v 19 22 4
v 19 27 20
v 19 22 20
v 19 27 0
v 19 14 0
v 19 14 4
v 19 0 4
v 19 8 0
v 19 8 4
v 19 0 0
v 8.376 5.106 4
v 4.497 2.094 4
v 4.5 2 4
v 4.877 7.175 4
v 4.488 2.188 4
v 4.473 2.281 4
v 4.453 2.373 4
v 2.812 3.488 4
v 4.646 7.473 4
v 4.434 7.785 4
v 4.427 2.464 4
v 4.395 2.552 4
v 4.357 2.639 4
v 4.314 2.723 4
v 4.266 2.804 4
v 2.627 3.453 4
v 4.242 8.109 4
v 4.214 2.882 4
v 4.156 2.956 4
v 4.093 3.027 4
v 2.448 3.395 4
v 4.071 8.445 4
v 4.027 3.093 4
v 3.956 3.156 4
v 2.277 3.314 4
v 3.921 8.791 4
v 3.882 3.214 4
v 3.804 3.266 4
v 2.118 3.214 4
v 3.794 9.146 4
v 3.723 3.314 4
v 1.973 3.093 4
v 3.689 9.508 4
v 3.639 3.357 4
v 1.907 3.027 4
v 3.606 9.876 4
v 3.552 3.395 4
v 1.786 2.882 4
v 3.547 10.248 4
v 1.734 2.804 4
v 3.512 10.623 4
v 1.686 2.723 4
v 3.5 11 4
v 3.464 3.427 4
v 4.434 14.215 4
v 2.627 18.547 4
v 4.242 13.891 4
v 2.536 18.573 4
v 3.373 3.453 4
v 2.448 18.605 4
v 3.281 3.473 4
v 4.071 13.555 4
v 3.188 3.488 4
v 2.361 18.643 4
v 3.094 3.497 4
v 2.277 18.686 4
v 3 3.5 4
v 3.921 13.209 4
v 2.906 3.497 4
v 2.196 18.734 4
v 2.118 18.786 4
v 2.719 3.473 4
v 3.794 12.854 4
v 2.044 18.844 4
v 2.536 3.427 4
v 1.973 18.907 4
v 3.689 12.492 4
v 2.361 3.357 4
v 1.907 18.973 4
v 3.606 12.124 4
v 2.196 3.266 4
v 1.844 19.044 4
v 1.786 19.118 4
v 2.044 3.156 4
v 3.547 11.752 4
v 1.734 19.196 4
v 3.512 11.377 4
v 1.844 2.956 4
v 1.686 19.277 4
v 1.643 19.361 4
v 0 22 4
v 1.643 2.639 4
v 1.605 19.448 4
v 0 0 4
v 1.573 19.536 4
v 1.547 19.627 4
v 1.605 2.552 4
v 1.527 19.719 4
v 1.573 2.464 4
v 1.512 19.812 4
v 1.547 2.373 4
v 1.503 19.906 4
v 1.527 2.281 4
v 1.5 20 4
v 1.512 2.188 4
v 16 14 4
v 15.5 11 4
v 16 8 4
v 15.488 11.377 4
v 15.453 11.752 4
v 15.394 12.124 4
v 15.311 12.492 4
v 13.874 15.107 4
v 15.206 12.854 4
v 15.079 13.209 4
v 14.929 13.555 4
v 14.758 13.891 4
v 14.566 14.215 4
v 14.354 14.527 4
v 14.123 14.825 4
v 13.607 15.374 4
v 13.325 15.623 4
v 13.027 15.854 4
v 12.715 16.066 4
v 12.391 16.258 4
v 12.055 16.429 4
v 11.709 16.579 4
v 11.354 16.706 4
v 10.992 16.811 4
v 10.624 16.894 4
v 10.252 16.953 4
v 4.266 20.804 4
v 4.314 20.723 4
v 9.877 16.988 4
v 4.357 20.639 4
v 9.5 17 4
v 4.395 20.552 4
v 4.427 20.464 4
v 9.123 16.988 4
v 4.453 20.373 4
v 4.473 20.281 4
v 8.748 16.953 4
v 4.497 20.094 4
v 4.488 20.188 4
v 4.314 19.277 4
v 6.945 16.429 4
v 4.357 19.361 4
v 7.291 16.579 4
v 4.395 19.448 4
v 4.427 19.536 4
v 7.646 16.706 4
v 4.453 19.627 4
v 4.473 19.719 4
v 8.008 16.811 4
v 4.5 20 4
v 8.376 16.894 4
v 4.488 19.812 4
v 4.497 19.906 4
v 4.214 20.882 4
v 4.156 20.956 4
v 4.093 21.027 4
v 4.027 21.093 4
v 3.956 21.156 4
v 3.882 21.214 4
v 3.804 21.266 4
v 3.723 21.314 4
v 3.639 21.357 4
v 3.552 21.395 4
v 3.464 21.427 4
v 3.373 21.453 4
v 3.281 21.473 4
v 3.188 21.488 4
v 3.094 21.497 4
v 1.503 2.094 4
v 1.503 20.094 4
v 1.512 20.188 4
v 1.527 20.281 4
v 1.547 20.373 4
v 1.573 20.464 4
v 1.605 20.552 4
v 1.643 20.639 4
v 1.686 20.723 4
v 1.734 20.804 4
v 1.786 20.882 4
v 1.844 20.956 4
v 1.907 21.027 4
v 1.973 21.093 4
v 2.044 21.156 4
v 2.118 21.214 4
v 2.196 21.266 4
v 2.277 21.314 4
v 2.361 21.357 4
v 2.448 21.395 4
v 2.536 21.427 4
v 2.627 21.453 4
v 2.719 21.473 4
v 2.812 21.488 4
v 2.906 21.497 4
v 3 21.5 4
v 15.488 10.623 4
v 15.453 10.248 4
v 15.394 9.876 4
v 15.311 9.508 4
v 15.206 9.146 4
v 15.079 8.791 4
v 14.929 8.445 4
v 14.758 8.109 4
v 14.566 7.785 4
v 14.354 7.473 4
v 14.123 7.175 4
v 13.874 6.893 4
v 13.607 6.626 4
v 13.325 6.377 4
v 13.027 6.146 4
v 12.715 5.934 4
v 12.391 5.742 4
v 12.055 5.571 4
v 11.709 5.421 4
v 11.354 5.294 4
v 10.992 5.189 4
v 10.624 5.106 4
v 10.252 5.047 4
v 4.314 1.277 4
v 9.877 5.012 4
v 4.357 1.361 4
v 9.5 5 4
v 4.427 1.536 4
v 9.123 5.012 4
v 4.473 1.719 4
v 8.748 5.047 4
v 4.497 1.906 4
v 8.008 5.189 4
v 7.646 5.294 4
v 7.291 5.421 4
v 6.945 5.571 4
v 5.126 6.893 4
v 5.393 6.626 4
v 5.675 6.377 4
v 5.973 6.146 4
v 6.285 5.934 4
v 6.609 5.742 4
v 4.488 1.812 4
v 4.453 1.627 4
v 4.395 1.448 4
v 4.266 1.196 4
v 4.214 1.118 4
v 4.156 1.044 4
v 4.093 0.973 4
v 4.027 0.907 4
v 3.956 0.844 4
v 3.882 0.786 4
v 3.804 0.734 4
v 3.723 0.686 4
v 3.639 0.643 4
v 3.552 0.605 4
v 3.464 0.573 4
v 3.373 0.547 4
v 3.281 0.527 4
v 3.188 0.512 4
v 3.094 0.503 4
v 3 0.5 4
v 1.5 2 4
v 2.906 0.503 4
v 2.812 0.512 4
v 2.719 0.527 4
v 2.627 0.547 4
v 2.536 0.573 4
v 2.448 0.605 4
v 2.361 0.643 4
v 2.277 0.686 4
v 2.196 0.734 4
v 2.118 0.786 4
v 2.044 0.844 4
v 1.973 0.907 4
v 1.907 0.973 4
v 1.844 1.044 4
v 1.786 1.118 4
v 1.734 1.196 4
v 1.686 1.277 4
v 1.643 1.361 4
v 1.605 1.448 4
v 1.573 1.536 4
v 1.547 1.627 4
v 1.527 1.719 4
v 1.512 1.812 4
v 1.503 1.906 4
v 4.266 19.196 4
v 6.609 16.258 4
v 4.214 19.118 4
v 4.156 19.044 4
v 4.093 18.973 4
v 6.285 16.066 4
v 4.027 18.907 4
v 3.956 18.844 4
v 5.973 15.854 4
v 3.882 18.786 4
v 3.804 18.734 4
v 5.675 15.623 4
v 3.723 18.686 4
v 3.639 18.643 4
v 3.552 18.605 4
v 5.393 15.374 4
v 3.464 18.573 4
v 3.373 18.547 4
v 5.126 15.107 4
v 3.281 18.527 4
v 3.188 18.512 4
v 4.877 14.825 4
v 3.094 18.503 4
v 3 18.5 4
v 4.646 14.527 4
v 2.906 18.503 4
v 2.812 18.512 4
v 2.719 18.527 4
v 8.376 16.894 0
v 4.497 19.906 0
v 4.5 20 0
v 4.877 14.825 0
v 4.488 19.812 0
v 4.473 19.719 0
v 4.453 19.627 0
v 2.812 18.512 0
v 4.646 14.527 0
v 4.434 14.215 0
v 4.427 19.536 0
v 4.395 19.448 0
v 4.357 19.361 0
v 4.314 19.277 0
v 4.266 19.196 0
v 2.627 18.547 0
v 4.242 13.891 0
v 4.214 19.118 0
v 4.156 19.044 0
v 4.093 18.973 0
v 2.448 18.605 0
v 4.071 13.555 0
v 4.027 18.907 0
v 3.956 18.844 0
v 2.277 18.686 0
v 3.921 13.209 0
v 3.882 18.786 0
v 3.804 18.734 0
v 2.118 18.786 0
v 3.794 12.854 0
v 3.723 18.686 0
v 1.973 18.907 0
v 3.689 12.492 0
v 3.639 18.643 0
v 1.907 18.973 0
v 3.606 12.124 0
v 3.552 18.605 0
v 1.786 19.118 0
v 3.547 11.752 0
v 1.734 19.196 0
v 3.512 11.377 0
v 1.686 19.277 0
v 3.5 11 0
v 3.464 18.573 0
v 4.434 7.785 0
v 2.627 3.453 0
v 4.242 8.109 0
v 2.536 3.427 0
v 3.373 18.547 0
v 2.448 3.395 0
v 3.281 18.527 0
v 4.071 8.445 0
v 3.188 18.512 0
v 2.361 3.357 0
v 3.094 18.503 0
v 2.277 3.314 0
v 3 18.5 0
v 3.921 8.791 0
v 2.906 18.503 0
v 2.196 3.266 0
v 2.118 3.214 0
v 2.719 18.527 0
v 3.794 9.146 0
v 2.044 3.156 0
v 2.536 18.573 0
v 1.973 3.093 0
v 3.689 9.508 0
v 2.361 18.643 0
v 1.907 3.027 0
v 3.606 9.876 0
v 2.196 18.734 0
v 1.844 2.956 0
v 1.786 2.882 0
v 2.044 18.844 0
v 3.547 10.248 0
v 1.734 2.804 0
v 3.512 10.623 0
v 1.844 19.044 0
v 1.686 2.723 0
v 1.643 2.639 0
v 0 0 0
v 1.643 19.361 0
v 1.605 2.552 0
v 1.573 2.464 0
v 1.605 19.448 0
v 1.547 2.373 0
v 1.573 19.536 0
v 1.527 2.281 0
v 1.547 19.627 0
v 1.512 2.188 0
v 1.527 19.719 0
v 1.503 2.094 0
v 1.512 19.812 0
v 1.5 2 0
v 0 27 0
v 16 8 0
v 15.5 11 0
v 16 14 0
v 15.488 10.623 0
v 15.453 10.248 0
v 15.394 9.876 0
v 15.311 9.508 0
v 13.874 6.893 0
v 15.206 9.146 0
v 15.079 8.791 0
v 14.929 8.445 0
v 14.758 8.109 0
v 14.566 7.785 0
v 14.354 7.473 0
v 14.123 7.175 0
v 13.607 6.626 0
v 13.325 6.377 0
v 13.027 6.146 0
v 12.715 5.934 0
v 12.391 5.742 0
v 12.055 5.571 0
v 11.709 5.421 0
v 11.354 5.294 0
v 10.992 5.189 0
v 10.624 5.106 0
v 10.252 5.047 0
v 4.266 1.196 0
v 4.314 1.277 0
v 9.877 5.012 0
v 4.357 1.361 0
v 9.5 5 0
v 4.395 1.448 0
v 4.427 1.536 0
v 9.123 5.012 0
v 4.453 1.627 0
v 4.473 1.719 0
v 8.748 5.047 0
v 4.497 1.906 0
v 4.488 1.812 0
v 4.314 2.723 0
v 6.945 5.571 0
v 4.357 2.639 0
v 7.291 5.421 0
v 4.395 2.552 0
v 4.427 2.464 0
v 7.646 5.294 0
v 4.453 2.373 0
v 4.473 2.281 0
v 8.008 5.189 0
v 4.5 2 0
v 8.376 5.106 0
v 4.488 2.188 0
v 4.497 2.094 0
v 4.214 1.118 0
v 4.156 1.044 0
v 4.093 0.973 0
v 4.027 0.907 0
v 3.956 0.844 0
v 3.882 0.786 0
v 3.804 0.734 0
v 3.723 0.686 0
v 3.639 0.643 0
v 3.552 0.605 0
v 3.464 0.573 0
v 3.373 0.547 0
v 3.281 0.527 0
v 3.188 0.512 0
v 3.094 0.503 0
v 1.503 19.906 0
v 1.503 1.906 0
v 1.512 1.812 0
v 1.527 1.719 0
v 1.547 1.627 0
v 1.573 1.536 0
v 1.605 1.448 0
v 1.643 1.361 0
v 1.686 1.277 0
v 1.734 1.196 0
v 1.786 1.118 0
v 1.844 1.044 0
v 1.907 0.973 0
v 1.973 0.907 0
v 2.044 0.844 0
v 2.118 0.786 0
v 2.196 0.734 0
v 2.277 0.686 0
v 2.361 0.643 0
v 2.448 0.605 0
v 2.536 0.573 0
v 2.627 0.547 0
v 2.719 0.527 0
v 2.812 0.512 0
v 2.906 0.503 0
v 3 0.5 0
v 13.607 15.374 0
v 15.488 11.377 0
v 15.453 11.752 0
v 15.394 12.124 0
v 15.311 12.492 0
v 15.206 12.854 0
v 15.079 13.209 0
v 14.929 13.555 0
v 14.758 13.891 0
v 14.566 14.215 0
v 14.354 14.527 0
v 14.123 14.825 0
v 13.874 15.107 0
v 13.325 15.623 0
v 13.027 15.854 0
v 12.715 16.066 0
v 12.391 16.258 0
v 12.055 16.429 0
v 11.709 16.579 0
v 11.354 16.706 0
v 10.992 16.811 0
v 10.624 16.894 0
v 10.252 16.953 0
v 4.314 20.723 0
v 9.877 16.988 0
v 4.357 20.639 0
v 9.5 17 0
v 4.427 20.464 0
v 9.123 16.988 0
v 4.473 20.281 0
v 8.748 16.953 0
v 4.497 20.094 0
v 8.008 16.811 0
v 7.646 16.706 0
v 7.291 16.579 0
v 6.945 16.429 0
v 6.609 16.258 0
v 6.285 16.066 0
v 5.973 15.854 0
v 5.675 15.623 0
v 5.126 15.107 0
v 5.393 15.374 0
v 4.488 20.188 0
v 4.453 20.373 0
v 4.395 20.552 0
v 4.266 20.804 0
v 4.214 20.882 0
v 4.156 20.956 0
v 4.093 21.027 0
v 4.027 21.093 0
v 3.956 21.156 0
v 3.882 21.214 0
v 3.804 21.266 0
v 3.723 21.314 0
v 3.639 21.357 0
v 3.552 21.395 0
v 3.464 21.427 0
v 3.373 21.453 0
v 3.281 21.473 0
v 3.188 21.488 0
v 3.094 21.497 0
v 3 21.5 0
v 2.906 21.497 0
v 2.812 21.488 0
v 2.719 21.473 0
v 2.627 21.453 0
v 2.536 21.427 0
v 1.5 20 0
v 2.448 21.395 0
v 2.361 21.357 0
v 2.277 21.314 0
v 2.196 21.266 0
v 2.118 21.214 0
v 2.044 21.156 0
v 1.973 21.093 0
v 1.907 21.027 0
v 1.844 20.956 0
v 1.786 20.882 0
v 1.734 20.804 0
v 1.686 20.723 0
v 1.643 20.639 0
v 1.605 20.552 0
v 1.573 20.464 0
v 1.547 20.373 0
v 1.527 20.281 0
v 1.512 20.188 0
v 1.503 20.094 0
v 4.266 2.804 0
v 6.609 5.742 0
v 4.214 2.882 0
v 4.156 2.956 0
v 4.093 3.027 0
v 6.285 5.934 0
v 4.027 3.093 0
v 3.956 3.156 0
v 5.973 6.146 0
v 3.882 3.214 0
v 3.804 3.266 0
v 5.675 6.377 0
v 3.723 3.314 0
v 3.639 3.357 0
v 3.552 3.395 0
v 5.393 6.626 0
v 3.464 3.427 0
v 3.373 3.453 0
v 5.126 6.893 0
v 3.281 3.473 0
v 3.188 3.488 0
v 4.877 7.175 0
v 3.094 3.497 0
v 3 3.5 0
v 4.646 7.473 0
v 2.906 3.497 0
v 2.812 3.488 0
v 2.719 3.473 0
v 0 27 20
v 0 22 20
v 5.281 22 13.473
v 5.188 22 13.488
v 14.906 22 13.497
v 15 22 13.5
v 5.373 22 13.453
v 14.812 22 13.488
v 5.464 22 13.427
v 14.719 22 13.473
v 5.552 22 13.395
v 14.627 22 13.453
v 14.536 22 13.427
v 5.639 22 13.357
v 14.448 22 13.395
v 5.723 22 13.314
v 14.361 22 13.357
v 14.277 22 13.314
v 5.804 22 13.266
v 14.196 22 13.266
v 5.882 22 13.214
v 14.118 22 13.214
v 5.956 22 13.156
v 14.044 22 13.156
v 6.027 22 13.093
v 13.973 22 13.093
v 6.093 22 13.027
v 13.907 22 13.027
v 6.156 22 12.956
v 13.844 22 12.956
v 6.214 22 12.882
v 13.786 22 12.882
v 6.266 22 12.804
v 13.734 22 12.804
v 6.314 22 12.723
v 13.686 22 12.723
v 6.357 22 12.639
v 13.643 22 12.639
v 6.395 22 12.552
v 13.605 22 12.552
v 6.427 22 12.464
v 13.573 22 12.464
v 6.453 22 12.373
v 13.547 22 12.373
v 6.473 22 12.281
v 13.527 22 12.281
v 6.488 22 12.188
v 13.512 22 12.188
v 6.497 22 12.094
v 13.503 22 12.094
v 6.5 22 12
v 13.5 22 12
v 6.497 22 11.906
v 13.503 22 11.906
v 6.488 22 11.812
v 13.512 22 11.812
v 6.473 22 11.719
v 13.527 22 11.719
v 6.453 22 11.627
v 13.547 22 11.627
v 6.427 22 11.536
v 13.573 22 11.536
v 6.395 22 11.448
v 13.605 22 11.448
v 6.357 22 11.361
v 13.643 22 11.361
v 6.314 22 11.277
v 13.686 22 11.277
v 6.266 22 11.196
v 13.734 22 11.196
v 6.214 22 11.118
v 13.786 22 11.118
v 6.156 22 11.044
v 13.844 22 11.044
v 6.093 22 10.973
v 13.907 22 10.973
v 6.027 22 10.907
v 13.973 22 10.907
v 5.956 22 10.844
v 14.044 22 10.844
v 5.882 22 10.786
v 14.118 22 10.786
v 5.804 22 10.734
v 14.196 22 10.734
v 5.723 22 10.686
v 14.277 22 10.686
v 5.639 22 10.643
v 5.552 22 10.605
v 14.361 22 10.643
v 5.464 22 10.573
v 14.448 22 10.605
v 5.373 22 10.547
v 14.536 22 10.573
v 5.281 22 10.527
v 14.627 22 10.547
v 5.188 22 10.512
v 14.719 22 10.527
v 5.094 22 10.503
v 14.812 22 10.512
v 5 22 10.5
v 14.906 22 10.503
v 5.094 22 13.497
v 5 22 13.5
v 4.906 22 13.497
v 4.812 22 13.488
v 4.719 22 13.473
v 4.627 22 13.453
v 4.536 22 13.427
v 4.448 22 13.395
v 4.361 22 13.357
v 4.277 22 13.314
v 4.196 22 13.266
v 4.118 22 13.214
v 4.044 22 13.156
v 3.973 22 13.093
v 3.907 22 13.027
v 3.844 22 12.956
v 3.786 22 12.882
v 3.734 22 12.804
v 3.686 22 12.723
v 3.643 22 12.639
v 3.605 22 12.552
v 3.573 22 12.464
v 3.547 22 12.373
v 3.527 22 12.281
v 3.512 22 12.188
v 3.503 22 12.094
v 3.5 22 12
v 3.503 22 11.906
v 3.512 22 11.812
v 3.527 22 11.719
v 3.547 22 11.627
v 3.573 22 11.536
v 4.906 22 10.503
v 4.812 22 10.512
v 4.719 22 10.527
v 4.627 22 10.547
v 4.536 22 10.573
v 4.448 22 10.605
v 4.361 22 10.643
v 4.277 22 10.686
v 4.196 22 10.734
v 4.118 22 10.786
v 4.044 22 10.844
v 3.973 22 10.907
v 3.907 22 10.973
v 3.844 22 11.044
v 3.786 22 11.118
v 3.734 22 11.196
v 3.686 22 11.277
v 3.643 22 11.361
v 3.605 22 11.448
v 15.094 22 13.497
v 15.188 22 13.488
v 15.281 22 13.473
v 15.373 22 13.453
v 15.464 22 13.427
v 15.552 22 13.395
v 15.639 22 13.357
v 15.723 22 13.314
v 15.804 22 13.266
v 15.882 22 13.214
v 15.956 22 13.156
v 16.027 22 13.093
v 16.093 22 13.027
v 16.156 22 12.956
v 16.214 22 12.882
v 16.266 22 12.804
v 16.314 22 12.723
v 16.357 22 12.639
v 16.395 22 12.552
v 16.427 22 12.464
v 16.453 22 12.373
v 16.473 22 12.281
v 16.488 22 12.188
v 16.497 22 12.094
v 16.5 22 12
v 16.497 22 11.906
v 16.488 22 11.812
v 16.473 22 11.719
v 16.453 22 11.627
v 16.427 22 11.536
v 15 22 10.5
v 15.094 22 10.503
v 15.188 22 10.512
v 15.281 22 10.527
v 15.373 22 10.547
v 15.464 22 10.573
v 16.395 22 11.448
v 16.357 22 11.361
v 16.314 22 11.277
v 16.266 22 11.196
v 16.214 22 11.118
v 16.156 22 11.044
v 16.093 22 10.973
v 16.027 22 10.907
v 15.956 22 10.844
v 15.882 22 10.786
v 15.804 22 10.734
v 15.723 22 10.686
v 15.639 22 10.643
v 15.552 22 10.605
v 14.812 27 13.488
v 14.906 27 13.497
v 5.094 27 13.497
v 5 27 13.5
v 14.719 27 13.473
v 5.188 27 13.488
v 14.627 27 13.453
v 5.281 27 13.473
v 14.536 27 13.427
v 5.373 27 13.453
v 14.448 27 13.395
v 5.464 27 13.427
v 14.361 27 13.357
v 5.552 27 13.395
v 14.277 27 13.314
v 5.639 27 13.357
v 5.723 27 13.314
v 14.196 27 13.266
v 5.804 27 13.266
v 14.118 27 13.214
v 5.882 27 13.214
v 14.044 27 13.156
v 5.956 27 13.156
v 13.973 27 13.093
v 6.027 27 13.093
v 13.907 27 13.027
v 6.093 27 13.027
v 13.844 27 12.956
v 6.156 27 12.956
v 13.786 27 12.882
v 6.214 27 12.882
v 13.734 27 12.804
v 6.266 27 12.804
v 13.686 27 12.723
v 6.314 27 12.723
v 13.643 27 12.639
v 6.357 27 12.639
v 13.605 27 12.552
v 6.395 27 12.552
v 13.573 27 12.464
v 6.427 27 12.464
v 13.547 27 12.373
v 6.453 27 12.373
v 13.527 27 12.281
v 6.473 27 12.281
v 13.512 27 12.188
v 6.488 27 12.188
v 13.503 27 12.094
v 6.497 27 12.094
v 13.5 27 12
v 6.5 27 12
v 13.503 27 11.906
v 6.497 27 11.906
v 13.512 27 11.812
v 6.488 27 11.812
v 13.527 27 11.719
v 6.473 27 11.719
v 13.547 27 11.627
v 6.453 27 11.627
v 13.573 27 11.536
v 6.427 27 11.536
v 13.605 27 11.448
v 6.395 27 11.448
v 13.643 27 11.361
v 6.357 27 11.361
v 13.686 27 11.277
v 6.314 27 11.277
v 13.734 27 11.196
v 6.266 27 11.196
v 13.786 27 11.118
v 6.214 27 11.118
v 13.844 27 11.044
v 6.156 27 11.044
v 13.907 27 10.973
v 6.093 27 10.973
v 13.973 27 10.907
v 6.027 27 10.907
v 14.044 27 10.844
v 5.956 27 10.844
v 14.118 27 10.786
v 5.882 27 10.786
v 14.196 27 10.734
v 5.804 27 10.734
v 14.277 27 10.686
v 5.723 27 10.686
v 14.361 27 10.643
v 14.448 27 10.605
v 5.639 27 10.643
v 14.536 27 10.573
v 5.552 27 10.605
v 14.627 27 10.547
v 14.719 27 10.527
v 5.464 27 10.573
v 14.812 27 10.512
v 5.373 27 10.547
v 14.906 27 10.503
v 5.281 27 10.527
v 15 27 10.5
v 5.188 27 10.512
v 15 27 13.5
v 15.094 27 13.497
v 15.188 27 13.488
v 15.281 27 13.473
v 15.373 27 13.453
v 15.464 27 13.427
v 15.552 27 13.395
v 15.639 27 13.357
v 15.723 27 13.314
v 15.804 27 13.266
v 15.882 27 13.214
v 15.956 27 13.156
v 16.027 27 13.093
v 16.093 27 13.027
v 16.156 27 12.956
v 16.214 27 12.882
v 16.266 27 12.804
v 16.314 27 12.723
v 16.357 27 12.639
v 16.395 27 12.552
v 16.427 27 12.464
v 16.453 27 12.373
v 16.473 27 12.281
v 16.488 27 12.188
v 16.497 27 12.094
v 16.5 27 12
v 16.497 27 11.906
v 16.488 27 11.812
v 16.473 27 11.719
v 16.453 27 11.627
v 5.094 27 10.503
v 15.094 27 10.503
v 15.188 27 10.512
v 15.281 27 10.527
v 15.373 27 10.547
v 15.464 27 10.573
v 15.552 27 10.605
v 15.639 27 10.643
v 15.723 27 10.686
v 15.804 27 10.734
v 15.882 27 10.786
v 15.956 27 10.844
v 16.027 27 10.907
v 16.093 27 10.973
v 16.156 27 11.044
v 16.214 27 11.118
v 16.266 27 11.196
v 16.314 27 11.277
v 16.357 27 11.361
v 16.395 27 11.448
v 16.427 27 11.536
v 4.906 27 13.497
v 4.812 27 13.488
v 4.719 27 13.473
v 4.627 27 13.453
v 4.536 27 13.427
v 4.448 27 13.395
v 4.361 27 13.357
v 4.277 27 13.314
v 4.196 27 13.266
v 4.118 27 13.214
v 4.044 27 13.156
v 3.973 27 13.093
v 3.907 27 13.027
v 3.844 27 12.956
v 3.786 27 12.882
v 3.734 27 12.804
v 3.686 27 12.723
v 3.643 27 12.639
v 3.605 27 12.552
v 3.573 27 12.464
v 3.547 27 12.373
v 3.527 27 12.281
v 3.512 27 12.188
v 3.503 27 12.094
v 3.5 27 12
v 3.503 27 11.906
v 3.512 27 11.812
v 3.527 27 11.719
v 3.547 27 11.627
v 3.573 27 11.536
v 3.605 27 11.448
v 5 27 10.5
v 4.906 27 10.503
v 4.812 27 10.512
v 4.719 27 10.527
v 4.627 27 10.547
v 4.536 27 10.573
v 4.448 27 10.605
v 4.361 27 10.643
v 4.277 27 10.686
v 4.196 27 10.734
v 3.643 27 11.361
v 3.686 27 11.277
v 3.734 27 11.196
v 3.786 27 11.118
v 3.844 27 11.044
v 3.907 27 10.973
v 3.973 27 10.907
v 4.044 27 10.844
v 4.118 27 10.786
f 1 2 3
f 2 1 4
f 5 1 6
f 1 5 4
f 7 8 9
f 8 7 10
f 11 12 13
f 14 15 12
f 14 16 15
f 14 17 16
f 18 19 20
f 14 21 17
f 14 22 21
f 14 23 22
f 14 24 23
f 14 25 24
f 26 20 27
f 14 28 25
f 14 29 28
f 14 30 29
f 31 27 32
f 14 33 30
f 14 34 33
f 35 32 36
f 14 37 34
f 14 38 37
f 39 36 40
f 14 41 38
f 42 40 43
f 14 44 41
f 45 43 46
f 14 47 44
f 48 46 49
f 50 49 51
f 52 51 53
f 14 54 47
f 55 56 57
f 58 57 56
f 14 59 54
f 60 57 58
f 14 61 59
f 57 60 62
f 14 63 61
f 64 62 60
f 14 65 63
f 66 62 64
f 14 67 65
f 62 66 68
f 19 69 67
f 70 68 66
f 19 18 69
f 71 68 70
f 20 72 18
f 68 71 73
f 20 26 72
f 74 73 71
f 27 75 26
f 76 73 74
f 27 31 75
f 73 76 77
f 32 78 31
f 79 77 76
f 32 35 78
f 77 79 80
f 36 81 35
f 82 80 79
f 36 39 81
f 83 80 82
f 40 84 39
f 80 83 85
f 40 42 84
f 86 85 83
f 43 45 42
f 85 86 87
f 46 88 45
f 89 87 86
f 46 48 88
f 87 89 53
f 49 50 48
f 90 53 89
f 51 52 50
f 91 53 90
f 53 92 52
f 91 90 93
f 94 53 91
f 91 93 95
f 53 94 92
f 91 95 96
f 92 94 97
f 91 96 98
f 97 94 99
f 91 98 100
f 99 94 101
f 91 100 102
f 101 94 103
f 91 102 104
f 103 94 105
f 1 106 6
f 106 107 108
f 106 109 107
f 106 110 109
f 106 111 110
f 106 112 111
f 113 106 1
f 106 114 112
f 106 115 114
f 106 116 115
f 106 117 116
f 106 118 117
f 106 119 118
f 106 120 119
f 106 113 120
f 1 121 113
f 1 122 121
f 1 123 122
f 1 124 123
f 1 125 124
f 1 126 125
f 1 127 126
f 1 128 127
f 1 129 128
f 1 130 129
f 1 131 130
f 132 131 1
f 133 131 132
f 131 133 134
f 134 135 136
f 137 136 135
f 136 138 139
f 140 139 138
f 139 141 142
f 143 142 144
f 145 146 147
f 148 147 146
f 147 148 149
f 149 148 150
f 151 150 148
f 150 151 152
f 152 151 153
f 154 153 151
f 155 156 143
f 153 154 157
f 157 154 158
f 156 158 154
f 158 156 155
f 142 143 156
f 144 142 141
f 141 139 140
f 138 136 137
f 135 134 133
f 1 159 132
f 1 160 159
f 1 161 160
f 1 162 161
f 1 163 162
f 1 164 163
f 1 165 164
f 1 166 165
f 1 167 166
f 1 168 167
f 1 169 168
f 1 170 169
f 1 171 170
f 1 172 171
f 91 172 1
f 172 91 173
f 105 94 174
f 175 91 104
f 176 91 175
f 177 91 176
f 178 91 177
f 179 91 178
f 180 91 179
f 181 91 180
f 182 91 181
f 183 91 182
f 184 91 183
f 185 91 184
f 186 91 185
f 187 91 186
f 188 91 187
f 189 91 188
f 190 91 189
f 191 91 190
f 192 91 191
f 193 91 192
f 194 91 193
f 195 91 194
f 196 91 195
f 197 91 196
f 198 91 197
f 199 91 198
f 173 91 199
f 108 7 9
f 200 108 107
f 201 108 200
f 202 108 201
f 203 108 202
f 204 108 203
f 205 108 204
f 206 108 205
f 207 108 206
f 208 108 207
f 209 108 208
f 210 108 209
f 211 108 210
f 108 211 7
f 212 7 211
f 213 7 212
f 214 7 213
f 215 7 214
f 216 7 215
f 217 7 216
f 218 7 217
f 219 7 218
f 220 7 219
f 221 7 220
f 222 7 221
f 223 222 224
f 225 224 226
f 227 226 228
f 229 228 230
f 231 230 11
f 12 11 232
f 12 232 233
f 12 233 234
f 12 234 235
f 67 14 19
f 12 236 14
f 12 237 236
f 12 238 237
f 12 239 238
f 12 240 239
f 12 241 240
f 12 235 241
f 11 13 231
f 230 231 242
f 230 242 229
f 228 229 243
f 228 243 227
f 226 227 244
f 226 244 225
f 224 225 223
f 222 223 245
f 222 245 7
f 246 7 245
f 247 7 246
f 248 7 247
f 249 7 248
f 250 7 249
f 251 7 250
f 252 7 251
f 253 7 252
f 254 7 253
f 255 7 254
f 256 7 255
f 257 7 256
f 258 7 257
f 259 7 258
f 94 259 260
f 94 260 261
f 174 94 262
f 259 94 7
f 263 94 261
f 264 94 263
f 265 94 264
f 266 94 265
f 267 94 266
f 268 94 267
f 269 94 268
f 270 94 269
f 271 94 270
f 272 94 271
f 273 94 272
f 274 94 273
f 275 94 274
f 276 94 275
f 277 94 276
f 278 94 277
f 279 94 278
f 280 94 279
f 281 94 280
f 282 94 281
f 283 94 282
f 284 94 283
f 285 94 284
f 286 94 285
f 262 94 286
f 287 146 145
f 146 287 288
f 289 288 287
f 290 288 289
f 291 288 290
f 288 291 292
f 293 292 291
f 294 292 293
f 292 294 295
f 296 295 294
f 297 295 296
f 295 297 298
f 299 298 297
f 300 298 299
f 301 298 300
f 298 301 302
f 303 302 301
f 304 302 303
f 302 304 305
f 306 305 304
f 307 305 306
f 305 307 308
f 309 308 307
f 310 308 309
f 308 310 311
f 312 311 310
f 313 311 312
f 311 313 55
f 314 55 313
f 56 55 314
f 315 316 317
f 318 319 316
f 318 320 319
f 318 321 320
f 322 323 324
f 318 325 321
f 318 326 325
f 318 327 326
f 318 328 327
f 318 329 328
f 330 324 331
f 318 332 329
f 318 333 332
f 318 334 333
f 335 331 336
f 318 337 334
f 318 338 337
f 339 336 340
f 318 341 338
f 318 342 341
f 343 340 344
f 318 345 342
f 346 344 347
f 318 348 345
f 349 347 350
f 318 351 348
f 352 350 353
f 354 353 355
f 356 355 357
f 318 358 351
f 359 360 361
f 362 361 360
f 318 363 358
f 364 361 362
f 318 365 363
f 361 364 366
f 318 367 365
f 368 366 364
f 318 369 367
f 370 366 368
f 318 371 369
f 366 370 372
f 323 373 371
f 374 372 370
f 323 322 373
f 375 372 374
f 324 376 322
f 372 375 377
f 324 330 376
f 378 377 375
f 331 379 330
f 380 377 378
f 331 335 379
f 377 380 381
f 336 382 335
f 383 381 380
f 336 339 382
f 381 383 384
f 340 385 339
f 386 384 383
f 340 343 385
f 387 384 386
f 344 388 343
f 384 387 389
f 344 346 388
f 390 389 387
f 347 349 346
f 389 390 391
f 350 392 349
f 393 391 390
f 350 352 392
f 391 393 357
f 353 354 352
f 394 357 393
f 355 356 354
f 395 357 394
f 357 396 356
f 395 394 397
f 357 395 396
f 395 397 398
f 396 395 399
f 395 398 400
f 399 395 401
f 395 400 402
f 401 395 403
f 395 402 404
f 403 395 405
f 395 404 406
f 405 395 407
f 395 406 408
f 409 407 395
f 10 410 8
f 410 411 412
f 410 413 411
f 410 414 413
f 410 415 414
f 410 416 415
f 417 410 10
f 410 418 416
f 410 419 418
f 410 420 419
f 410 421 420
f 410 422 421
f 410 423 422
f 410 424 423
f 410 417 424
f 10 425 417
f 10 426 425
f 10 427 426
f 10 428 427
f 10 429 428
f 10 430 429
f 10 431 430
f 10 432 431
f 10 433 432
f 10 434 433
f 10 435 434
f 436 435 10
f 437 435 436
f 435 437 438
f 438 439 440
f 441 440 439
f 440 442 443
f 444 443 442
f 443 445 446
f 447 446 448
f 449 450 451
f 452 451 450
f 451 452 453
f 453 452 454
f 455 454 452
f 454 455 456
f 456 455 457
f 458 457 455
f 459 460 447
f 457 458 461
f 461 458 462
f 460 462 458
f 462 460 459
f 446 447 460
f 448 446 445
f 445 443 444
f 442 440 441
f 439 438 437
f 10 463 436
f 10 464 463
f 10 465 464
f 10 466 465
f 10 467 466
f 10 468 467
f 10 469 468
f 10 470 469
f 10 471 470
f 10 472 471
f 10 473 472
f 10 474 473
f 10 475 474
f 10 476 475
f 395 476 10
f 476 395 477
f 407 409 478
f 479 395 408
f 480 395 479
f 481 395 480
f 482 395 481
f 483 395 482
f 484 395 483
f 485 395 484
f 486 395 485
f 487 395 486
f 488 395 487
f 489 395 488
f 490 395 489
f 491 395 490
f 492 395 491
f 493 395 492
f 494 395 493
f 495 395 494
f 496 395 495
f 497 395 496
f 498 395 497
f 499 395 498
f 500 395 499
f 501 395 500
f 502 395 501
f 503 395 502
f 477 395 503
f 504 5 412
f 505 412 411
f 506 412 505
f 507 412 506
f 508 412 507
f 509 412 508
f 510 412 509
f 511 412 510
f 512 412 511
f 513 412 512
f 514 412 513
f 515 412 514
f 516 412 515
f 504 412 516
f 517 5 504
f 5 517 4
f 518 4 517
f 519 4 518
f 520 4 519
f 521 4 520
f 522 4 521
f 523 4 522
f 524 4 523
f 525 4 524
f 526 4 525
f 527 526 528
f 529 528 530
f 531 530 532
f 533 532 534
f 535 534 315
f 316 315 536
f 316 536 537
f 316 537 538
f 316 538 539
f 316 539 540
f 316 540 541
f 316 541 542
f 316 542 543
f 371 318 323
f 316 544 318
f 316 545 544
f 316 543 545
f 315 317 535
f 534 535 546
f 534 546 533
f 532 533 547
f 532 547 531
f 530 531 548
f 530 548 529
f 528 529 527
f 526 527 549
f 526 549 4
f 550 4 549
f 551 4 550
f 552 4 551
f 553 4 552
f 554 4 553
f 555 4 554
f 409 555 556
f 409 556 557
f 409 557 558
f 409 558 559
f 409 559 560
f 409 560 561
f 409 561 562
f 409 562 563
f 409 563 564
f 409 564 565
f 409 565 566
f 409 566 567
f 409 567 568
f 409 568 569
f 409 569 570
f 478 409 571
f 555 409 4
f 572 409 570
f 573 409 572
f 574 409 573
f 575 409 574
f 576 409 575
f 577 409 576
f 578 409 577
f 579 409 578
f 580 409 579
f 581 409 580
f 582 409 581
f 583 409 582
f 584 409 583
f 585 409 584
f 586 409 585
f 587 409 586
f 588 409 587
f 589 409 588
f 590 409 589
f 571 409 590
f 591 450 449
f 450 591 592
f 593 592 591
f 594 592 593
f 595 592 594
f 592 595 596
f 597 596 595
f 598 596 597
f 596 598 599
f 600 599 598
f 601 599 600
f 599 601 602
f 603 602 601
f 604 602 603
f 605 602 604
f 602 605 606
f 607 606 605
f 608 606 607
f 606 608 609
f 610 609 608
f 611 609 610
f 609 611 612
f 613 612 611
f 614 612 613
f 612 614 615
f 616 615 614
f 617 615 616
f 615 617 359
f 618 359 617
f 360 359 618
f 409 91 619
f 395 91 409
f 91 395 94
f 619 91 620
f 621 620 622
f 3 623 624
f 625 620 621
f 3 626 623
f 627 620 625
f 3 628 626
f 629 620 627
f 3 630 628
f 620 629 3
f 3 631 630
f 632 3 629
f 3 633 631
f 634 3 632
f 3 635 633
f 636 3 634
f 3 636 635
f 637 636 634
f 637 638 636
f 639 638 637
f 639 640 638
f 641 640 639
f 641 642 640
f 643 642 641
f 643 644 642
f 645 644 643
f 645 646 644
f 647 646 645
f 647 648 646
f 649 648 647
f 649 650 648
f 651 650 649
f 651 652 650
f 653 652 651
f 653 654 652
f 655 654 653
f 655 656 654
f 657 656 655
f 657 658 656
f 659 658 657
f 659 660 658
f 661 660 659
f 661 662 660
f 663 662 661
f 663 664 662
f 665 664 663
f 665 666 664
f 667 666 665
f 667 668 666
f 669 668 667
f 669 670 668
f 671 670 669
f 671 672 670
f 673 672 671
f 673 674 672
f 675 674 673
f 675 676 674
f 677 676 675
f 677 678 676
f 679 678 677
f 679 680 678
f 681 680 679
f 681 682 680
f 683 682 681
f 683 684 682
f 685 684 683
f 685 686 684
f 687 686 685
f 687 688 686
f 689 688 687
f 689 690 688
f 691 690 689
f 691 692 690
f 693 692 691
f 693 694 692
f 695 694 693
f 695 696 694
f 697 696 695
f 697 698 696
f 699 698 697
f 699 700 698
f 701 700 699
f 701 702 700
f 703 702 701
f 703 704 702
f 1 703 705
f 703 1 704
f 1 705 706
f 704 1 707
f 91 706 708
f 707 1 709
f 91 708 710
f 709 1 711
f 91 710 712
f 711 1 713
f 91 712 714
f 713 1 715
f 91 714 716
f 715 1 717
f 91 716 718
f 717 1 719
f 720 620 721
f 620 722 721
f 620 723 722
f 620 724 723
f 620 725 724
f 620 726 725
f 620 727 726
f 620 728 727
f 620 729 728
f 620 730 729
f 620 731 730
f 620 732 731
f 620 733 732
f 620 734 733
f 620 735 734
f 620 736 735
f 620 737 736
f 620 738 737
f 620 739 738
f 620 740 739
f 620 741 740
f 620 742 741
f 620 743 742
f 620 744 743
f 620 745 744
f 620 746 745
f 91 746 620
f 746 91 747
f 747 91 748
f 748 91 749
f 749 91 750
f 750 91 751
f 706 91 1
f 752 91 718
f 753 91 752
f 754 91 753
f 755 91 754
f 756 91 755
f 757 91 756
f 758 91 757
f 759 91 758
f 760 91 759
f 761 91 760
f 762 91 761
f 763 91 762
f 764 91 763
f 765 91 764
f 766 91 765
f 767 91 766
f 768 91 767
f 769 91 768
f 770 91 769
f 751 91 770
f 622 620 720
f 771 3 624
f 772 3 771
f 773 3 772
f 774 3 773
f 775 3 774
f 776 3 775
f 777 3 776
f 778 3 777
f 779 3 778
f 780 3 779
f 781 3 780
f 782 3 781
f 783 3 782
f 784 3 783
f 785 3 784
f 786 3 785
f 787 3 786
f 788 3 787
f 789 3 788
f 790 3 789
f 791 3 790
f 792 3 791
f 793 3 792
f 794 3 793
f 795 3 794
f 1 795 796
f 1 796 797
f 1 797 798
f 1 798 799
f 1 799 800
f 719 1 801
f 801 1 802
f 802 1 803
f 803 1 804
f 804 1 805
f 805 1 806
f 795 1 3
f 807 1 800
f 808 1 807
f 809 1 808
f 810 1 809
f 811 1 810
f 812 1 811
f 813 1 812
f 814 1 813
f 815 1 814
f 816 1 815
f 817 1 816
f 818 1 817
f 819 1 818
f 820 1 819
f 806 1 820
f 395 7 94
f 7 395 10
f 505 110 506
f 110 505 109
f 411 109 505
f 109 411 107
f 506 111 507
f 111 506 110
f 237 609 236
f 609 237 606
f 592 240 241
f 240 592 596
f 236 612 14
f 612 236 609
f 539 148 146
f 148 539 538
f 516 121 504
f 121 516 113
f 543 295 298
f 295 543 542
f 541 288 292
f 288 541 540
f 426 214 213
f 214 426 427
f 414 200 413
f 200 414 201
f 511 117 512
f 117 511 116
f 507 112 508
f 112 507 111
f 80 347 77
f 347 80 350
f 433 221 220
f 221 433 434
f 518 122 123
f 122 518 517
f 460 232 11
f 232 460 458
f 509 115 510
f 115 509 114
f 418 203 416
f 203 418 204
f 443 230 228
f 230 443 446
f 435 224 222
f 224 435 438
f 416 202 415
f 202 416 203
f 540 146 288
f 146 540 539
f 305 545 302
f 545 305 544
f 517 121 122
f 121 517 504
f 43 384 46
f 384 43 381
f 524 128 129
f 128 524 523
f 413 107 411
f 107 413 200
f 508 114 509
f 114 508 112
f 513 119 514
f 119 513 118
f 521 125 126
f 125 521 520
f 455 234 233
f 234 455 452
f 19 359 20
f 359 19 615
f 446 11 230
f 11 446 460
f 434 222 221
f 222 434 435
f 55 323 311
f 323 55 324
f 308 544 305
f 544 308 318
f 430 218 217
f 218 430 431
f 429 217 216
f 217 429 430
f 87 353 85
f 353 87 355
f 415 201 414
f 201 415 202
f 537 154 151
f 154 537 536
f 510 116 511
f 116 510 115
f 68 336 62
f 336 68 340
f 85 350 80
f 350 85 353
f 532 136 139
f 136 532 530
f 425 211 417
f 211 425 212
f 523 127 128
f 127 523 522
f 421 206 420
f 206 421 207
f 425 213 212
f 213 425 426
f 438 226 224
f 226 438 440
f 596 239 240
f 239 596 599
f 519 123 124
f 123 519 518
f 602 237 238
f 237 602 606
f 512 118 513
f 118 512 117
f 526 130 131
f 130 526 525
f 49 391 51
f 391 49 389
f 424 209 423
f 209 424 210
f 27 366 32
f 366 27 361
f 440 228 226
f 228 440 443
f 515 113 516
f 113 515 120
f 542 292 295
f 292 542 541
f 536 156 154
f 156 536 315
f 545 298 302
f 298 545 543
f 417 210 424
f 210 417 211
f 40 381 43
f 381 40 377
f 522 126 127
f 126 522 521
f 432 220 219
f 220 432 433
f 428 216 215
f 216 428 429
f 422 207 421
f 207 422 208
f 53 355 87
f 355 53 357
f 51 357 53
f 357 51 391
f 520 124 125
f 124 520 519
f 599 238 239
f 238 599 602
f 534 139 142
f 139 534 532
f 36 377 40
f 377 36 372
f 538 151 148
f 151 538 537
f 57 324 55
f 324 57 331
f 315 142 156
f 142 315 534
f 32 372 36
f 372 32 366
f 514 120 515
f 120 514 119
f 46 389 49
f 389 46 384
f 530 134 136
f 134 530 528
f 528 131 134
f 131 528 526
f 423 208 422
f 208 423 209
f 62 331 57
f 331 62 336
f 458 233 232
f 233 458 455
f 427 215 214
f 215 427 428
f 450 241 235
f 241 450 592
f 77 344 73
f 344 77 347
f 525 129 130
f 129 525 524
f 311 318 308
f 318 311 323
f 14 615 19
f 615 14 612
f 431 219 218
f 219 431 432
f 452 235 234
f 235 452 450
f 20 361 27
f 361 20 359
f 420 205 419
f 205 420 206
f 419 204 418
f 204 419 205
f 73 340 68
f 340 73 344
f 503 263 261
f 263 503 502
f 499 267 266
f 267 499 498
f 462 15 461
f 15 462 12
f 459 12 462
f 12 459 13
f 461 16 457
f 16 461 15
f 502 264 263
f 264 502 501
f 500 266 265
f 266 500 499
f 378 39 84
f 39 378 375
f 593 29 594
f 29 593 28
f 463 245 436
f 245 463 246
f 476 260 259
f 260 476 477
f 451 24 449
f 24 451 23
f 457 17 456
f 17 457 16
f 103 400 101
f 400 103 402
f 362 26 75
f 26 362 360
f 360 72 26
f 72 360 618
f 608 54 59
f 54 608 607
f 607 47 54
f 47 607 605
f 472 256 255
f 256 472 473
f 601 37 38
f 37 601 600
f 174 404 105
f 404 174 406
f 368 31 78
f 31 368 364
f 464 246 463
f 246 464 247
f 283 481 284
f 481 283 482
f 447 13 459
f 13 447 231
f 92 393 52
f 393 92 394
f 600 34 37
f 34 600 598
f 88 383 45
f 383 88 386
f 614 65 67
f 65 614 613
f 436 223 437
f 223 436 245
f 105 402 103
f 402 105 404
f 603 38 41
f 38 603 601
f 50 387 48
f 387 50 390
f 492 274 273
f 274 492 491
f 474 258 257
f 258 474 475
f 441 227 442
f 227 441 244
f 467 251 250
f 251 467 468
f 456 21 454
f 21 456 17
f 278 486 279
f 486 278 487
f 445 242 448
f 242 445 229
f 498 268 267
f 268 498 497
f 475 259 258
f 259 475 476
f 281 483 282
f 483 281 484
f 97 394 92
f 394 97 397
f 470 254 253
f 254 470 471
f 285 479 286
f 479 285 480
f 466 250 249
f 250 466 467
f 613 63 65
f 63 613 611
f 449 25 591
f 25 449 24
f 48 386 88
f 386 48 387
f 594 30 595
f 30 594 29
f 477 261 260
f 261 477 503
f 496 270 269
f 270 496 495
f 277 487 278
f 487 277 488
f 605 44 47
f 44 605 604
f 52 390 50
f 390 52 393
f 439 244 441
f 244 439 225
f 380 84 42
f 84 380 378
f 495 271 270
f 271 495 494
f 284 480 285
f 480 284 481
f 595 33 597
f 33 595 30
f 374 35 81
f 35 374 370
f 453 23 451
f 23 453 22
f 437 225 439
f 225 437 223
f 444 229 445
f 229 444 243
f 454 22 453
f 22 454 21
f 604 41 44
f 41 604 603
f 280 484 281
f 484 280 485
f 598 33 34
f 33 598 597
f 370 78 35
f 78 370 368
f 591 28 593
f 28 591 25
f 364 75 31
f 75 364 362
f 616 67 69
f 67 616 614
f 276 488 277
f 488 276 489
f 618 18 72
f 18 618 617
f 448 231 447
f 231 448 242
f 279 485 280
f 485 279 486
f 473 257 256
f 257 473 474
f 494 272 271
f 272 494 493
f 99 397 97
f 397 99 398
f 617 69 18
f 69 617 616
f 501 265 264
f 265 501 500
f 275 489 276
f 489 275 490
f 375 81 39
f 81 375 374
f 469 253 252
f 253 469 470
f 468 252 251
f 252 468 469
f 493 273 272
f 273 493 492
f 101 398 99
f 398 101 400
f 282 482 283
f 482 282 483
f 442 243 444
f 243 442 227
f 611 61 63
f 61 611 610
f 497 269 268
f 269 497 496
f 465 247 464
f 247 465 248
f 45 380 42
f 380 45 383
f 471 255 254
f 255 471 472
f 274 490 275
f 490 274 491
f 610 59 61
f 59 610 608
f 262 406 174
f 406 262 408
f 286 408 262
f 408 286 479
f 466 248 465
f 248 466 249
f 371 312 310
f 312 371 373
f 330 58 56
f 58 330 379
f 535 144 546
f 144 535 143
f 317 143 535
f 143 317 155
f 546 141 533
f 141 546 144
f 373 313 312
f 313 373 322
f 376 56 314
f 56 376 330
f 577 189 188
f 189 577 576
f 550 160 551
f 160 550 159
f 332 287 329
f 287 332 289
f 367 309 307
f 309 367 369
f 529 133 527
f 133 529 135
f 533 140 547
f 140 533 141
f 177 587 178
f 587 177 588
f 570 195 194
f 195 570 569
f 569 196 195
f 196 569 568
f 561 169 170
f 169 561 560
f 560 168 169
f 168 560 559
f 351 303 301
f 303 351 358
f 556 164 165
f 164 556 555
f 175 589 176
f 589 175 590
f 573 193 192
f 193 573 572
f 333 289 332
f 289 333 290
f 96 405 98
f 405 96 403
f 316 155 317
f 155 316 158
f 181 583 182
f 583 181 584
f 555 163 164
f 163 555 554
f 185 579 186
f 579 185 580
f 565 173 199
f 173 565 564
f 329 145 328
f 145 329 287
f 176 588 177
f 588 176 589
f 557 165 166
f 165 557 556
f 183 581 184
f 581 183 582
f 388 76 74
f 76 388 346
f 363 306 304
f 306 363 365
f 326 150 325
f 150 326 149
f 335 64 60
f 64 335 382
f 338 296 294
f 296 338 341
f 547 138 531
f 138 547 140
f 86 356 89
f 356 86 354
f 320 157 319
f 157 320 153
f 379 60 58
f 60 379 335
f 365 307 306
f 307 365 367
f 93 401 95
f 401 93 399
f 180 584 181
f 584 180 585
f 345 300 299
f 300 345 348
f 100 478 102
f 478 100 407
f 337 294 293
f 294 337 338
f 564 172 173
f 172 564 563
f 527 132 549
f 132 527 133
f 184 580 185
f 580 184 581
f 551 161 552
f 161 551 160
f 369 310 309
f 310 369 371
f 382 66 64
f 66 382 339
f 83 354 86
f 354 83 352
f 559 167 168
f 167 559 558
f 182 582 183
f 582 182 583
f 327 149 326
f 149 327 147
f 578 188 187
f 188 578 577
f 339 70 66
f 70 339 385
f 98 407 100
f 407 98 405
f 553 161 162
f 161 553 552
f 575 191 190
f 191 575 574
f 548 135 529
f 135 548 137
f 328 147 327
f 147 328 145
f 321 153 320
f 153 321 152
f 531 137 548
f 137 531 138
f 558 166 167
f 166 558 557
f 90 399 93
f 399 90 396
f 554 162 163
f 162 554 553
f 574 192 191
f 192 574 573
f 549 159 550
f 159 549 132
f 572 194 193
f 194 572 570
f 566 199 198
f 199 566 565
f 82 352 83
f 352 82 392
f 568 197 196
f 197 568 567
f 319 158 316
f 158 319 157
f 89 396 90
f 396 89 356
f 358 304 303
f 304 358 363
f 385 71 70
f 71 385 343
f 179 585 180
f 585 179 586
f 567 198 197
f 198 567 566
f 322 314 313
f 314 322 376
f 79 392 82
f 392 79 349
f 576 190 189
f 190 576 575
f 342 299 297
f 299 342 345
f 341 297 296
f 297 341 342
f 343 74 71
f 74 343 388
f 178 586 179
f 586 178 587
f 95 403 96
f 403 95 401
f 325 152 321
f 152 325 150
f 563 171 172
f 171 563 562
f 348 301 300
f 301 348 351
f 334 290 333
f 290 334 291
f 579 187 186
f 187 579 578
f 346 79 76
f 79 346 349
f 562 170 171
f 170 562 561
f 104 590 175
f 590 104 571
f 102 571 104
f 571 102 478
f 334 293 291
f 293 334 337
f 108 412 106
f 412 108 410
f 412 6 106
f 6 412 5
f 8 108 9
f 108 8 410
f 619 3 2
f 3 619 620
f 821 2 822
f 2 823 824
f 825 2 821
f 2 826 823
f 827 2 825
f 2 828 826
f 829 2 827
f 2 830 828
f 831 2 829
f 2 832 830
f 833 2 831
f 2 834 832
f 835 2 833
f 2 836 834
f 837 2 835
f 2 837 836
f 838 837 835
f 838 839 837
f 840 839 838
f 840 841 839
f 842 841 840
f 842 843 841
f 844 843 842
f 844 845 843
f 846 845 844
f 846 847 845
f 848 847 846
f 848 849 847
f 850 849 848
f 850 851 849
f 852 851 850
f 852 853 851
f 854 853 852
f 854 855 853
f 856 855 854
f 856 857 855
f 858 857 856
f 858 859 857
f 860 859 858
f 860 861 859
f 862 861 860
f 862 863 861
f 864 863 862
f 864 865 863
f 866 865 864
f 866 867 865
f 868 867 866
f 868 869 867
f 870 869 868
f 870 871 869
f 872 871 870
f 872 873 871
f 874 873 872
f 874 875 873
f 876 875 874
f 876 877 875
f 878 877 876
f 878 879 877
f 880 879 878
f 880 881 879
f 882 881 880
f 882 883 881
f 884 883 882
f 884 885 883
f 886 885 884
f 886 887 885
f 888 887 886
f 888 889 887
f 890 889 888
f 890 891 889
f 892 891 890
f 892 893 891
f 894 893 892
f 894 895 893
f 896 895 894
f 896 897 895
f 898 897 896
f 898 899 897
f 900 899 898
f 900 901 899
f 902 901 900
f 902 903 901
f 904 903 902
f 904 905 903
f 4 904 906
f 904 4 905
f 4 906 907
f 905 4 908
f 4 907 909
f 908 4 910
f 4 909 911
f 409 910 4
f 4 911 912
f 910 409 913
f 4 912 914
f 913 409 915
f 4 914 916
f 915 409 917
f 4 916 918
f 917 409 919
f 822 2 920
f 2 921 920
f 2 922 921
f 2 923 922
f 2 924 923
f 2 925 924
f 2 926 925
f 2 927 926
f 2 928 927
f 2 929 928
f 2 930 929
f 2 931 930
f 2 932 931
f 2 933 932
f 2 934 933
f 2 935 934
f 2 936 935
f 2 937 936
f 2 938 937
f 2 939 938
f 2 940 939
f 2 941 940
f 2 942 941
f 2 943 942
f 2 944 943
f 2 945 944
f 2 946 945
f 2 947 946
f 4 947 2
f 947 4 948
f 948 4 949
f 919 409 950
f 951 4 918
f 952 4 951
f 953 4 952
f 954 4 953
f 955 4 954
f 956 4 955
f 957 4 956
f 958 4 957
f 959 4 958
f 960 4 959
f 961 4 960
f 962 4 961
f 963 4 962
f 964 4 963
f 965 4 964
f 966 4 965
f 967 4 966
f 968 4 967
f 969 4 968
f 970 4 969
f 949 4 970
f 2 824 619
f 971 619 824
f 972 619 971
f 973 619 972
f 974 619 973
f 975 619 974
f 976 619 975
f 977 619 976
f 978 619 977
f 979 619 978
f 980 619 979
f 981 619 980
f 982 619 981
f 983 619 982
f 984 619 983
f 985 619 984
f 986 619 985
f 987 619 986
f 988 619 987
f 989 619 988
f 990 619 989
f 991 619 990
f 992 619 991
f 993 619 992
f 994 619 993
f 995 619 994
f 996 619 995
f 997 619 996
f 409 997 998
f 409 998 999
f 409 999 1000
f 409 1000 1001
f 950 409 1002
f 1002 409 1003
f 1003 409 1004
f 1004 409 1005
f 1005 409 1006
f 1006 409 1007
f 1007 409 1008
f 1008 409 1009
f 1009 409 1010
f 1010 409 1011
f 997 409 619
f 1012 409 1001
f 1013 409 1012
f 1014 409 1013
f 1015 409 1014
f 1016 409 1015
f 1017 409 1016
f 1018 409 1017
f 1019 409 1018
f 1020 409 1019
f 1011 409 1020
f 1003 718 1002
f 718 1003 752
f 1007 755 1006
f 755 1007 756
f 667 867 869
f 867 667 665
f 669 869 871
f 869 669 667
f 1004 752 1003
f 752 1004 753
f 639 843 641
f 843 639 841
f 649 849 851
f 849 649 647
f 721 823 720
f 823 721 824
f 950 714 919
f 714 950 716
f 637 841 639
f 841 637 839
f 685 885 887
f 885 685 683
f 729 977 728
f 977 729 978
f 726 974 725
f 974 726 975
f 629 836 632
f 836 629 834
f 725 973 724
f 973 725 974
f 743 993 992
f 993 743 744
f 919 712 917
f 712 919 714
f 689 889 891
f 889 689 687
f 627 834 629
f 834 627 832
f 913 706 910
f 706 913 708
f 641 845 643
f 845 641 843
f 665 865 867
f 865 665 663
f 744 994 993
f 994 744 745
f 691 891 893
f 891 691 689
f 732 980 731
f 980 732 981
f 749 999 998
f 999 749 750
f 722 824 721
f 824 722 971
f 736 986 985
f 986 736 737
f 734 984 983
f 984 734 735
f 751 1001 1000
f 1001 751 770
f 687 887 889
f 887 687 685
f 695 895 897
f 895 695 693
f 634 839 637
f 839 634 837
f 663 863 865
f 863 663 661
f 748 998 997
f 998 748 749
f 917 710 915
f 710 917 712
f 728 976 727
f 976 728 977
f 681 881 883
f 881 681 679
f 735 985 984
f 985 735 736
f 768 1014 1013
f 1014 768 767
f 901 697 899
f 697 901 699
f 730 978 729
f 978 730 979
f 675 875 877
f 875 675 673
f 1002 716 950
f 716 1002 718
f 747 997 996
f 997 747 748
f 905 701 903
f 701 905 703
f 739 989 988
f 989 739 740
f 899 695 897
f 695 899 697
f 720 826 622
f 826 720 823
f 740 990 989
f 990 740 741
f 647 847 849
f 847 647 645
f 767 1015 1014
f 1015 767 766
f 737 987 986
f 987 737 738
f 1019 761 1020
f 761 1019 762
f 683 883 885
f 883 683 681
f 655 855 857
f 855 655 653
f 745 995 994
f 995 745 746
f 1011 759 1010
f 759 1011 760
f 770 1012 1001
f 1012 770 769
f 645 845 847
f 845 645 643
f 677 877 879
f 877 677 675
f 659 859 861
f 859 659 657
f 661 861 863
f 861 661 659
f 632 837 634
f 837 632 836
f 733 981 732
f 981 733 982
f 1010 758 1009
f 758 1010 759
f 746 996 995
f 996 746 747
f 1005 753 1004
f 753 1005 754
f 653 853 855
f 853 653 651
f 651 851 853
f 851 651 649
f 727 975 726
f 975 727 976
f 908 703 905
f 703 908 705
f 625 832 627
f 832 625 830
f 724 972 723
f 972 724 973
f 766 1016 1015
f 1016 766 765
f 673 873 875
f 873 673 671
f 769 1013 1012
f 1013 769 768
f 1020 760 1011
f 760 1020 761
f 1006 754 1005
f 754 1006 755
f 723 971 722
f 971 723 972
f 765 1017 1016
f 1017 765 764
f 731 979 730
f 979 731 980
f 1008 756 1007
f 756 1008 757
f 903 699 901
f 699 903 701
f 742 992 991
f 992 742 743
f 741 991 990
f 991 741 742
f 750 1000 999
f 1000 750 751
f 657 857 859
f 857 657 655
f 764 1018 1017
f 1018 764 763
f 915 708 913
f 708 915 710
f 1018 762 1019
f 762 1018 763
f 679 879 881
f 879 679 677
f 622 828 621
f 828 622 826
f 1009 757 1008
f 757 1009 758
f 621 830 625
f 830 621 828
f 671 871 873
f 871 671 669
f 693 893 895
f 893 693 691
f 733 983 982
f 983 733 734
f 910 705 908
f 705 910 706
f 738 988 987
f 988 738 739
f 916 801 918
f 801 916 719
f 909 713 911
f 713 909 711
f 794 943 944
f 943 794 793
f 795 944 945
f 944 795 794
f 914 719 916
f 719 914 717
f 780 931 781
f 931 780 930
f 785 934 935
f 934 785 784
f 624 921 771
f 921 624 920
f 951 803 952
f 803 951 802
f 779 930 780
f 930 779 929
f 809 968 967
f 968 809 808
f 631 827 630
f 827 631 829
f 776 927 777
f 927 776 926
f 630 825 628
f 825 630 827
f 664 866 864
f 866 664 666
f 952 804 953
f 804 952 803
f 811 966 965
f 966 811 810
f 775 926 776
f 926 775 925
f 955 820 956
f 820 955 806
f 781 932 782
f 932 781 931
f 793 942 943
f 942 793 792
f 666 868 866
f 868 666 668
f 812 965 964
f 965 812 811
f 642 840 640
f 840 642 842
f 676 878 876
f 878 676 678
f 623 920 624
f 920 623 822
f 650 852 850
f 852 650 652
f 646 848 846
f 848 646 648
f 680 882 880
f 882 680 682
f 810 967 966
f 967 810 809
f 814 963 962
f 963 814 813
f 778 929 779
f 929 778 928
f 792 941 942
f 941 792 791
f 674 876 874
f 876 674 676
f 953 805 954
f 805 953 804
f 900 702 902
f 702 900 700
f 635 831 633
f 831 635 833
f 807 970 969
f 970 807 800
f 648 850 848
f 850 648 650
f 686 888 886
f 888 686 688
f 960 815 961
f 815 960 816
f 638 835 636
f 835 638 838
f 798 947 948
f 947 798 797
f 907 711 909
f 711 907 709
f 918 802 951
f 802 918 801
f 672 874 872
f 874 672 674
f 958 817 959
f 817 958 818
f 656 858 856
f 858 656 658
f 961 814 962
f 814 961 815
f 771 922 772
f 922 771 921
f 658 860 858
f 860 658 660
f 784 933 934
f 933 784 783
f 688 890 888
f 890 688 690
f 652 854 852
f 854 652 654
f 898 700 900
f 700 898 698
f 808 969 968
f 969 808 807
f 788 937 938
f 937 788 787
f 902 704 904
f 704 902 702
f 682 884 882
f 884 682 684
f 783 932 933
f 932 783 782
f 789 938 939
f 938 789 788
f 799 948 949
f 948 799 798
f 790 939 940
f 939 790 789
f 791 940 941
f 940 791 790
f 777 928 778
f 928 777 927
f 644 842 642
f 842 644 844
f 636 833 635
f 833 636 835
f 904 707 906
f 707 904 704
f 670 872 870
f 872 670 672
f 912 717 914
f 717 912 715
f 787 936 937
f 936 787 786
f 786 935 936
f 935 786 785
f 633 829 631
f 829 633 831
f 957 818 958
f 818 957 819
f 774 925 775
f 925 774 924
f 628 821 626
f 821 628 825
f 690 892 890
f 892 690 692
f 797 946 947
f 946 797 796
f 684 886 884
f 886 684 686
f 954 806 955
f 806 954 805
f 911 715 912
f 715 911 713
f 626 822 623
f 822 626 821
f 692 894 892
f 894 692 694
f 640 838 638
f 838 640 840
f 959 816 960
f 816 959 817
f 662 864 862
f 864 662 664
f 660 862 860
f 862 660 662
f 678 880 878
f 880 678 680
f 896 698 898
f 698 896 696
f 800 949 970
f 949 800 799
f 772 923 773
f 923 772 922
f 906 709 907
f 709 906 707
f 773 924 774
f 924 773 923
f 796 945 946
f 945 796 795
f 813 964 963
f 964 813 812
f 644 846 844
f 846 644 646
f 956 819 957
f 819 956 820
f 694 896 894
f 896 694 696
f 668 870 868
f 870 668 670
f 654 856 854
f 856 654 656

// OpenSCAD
// Taille de support sur le moteur
x_moteur = 19;
y_moteur = 22;
z_moteur = 4;

// Taille de support sur le plateau
x_plateau = x_moteur;
y_plateau = 5;
z_plateau = 20;

// Cylindre pour l'axe moteur
h_cylinder = 30;
diameter_cylinder = 12;

// Cylindre pour les fixations
h_vis = 30;
diameter_vis = 3;

$fn=100;

module fixation_moteur(){
difference(){
cube([x_moteur,y_moteur,z_moteur]);

translate([x_moteur/2,y_moteur/2,0]){
	cylinder(h_cylinder,d=diameter_cylinder);
}

translate([3,2,0]){
	cylinder(h_vis,d=diameter_vis);
}

translate([3,20,0]){
	cylinder(h_vis,d=diameter_vis);
}

translate([16,8,0]){
	cube([9,6,5]);
}

}

}// fin module fixation_moteur

union(){
	fixation_moteur();

	translate([0,y_moteur,0]){
		difference(){
			cube([x_plateau,y_plateau,z_plateau]);
			
			translate([5,5,12]){
				rotate([90,0,0]){
					cylinder(h_vis,d=diameter_vis);
				}
			}

			translate([15,5,12]){
				rotate([90,0,0]){
					cylinder(h_vis,d=diameter_vis);
				}
			}
		}
	}
}
